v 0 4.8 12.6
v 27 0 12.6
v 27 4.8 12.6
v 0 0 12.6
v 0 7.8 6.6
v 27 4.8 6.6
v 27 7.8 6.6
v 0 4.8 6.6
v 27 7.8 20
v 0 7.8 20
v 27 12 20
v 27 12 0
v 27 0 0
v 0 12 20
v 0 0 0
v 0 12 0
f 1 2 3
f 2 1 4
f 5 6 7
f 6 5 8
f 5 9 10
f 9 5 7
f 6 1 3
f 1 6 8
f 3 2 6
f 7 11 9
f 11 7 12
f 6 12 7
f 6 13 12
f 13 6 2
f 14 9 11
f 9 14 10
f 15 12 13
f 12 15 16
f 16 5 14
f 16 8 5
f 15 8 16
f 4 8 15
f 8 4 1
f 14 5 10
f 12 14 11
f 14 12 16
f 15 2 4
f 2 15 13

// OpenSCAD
difference() {
    color("red") cube ([27, 12, 20]);
    union() {
        color("yellow") translate ([-0.1,-0.1,20-7.4]) cube ([27.2, 5, 7.5]);
        color("pink") translate ([-0.1,5-0.2,20-13.4]) cube ([27.2, 3, 13.5]);
    }
}
